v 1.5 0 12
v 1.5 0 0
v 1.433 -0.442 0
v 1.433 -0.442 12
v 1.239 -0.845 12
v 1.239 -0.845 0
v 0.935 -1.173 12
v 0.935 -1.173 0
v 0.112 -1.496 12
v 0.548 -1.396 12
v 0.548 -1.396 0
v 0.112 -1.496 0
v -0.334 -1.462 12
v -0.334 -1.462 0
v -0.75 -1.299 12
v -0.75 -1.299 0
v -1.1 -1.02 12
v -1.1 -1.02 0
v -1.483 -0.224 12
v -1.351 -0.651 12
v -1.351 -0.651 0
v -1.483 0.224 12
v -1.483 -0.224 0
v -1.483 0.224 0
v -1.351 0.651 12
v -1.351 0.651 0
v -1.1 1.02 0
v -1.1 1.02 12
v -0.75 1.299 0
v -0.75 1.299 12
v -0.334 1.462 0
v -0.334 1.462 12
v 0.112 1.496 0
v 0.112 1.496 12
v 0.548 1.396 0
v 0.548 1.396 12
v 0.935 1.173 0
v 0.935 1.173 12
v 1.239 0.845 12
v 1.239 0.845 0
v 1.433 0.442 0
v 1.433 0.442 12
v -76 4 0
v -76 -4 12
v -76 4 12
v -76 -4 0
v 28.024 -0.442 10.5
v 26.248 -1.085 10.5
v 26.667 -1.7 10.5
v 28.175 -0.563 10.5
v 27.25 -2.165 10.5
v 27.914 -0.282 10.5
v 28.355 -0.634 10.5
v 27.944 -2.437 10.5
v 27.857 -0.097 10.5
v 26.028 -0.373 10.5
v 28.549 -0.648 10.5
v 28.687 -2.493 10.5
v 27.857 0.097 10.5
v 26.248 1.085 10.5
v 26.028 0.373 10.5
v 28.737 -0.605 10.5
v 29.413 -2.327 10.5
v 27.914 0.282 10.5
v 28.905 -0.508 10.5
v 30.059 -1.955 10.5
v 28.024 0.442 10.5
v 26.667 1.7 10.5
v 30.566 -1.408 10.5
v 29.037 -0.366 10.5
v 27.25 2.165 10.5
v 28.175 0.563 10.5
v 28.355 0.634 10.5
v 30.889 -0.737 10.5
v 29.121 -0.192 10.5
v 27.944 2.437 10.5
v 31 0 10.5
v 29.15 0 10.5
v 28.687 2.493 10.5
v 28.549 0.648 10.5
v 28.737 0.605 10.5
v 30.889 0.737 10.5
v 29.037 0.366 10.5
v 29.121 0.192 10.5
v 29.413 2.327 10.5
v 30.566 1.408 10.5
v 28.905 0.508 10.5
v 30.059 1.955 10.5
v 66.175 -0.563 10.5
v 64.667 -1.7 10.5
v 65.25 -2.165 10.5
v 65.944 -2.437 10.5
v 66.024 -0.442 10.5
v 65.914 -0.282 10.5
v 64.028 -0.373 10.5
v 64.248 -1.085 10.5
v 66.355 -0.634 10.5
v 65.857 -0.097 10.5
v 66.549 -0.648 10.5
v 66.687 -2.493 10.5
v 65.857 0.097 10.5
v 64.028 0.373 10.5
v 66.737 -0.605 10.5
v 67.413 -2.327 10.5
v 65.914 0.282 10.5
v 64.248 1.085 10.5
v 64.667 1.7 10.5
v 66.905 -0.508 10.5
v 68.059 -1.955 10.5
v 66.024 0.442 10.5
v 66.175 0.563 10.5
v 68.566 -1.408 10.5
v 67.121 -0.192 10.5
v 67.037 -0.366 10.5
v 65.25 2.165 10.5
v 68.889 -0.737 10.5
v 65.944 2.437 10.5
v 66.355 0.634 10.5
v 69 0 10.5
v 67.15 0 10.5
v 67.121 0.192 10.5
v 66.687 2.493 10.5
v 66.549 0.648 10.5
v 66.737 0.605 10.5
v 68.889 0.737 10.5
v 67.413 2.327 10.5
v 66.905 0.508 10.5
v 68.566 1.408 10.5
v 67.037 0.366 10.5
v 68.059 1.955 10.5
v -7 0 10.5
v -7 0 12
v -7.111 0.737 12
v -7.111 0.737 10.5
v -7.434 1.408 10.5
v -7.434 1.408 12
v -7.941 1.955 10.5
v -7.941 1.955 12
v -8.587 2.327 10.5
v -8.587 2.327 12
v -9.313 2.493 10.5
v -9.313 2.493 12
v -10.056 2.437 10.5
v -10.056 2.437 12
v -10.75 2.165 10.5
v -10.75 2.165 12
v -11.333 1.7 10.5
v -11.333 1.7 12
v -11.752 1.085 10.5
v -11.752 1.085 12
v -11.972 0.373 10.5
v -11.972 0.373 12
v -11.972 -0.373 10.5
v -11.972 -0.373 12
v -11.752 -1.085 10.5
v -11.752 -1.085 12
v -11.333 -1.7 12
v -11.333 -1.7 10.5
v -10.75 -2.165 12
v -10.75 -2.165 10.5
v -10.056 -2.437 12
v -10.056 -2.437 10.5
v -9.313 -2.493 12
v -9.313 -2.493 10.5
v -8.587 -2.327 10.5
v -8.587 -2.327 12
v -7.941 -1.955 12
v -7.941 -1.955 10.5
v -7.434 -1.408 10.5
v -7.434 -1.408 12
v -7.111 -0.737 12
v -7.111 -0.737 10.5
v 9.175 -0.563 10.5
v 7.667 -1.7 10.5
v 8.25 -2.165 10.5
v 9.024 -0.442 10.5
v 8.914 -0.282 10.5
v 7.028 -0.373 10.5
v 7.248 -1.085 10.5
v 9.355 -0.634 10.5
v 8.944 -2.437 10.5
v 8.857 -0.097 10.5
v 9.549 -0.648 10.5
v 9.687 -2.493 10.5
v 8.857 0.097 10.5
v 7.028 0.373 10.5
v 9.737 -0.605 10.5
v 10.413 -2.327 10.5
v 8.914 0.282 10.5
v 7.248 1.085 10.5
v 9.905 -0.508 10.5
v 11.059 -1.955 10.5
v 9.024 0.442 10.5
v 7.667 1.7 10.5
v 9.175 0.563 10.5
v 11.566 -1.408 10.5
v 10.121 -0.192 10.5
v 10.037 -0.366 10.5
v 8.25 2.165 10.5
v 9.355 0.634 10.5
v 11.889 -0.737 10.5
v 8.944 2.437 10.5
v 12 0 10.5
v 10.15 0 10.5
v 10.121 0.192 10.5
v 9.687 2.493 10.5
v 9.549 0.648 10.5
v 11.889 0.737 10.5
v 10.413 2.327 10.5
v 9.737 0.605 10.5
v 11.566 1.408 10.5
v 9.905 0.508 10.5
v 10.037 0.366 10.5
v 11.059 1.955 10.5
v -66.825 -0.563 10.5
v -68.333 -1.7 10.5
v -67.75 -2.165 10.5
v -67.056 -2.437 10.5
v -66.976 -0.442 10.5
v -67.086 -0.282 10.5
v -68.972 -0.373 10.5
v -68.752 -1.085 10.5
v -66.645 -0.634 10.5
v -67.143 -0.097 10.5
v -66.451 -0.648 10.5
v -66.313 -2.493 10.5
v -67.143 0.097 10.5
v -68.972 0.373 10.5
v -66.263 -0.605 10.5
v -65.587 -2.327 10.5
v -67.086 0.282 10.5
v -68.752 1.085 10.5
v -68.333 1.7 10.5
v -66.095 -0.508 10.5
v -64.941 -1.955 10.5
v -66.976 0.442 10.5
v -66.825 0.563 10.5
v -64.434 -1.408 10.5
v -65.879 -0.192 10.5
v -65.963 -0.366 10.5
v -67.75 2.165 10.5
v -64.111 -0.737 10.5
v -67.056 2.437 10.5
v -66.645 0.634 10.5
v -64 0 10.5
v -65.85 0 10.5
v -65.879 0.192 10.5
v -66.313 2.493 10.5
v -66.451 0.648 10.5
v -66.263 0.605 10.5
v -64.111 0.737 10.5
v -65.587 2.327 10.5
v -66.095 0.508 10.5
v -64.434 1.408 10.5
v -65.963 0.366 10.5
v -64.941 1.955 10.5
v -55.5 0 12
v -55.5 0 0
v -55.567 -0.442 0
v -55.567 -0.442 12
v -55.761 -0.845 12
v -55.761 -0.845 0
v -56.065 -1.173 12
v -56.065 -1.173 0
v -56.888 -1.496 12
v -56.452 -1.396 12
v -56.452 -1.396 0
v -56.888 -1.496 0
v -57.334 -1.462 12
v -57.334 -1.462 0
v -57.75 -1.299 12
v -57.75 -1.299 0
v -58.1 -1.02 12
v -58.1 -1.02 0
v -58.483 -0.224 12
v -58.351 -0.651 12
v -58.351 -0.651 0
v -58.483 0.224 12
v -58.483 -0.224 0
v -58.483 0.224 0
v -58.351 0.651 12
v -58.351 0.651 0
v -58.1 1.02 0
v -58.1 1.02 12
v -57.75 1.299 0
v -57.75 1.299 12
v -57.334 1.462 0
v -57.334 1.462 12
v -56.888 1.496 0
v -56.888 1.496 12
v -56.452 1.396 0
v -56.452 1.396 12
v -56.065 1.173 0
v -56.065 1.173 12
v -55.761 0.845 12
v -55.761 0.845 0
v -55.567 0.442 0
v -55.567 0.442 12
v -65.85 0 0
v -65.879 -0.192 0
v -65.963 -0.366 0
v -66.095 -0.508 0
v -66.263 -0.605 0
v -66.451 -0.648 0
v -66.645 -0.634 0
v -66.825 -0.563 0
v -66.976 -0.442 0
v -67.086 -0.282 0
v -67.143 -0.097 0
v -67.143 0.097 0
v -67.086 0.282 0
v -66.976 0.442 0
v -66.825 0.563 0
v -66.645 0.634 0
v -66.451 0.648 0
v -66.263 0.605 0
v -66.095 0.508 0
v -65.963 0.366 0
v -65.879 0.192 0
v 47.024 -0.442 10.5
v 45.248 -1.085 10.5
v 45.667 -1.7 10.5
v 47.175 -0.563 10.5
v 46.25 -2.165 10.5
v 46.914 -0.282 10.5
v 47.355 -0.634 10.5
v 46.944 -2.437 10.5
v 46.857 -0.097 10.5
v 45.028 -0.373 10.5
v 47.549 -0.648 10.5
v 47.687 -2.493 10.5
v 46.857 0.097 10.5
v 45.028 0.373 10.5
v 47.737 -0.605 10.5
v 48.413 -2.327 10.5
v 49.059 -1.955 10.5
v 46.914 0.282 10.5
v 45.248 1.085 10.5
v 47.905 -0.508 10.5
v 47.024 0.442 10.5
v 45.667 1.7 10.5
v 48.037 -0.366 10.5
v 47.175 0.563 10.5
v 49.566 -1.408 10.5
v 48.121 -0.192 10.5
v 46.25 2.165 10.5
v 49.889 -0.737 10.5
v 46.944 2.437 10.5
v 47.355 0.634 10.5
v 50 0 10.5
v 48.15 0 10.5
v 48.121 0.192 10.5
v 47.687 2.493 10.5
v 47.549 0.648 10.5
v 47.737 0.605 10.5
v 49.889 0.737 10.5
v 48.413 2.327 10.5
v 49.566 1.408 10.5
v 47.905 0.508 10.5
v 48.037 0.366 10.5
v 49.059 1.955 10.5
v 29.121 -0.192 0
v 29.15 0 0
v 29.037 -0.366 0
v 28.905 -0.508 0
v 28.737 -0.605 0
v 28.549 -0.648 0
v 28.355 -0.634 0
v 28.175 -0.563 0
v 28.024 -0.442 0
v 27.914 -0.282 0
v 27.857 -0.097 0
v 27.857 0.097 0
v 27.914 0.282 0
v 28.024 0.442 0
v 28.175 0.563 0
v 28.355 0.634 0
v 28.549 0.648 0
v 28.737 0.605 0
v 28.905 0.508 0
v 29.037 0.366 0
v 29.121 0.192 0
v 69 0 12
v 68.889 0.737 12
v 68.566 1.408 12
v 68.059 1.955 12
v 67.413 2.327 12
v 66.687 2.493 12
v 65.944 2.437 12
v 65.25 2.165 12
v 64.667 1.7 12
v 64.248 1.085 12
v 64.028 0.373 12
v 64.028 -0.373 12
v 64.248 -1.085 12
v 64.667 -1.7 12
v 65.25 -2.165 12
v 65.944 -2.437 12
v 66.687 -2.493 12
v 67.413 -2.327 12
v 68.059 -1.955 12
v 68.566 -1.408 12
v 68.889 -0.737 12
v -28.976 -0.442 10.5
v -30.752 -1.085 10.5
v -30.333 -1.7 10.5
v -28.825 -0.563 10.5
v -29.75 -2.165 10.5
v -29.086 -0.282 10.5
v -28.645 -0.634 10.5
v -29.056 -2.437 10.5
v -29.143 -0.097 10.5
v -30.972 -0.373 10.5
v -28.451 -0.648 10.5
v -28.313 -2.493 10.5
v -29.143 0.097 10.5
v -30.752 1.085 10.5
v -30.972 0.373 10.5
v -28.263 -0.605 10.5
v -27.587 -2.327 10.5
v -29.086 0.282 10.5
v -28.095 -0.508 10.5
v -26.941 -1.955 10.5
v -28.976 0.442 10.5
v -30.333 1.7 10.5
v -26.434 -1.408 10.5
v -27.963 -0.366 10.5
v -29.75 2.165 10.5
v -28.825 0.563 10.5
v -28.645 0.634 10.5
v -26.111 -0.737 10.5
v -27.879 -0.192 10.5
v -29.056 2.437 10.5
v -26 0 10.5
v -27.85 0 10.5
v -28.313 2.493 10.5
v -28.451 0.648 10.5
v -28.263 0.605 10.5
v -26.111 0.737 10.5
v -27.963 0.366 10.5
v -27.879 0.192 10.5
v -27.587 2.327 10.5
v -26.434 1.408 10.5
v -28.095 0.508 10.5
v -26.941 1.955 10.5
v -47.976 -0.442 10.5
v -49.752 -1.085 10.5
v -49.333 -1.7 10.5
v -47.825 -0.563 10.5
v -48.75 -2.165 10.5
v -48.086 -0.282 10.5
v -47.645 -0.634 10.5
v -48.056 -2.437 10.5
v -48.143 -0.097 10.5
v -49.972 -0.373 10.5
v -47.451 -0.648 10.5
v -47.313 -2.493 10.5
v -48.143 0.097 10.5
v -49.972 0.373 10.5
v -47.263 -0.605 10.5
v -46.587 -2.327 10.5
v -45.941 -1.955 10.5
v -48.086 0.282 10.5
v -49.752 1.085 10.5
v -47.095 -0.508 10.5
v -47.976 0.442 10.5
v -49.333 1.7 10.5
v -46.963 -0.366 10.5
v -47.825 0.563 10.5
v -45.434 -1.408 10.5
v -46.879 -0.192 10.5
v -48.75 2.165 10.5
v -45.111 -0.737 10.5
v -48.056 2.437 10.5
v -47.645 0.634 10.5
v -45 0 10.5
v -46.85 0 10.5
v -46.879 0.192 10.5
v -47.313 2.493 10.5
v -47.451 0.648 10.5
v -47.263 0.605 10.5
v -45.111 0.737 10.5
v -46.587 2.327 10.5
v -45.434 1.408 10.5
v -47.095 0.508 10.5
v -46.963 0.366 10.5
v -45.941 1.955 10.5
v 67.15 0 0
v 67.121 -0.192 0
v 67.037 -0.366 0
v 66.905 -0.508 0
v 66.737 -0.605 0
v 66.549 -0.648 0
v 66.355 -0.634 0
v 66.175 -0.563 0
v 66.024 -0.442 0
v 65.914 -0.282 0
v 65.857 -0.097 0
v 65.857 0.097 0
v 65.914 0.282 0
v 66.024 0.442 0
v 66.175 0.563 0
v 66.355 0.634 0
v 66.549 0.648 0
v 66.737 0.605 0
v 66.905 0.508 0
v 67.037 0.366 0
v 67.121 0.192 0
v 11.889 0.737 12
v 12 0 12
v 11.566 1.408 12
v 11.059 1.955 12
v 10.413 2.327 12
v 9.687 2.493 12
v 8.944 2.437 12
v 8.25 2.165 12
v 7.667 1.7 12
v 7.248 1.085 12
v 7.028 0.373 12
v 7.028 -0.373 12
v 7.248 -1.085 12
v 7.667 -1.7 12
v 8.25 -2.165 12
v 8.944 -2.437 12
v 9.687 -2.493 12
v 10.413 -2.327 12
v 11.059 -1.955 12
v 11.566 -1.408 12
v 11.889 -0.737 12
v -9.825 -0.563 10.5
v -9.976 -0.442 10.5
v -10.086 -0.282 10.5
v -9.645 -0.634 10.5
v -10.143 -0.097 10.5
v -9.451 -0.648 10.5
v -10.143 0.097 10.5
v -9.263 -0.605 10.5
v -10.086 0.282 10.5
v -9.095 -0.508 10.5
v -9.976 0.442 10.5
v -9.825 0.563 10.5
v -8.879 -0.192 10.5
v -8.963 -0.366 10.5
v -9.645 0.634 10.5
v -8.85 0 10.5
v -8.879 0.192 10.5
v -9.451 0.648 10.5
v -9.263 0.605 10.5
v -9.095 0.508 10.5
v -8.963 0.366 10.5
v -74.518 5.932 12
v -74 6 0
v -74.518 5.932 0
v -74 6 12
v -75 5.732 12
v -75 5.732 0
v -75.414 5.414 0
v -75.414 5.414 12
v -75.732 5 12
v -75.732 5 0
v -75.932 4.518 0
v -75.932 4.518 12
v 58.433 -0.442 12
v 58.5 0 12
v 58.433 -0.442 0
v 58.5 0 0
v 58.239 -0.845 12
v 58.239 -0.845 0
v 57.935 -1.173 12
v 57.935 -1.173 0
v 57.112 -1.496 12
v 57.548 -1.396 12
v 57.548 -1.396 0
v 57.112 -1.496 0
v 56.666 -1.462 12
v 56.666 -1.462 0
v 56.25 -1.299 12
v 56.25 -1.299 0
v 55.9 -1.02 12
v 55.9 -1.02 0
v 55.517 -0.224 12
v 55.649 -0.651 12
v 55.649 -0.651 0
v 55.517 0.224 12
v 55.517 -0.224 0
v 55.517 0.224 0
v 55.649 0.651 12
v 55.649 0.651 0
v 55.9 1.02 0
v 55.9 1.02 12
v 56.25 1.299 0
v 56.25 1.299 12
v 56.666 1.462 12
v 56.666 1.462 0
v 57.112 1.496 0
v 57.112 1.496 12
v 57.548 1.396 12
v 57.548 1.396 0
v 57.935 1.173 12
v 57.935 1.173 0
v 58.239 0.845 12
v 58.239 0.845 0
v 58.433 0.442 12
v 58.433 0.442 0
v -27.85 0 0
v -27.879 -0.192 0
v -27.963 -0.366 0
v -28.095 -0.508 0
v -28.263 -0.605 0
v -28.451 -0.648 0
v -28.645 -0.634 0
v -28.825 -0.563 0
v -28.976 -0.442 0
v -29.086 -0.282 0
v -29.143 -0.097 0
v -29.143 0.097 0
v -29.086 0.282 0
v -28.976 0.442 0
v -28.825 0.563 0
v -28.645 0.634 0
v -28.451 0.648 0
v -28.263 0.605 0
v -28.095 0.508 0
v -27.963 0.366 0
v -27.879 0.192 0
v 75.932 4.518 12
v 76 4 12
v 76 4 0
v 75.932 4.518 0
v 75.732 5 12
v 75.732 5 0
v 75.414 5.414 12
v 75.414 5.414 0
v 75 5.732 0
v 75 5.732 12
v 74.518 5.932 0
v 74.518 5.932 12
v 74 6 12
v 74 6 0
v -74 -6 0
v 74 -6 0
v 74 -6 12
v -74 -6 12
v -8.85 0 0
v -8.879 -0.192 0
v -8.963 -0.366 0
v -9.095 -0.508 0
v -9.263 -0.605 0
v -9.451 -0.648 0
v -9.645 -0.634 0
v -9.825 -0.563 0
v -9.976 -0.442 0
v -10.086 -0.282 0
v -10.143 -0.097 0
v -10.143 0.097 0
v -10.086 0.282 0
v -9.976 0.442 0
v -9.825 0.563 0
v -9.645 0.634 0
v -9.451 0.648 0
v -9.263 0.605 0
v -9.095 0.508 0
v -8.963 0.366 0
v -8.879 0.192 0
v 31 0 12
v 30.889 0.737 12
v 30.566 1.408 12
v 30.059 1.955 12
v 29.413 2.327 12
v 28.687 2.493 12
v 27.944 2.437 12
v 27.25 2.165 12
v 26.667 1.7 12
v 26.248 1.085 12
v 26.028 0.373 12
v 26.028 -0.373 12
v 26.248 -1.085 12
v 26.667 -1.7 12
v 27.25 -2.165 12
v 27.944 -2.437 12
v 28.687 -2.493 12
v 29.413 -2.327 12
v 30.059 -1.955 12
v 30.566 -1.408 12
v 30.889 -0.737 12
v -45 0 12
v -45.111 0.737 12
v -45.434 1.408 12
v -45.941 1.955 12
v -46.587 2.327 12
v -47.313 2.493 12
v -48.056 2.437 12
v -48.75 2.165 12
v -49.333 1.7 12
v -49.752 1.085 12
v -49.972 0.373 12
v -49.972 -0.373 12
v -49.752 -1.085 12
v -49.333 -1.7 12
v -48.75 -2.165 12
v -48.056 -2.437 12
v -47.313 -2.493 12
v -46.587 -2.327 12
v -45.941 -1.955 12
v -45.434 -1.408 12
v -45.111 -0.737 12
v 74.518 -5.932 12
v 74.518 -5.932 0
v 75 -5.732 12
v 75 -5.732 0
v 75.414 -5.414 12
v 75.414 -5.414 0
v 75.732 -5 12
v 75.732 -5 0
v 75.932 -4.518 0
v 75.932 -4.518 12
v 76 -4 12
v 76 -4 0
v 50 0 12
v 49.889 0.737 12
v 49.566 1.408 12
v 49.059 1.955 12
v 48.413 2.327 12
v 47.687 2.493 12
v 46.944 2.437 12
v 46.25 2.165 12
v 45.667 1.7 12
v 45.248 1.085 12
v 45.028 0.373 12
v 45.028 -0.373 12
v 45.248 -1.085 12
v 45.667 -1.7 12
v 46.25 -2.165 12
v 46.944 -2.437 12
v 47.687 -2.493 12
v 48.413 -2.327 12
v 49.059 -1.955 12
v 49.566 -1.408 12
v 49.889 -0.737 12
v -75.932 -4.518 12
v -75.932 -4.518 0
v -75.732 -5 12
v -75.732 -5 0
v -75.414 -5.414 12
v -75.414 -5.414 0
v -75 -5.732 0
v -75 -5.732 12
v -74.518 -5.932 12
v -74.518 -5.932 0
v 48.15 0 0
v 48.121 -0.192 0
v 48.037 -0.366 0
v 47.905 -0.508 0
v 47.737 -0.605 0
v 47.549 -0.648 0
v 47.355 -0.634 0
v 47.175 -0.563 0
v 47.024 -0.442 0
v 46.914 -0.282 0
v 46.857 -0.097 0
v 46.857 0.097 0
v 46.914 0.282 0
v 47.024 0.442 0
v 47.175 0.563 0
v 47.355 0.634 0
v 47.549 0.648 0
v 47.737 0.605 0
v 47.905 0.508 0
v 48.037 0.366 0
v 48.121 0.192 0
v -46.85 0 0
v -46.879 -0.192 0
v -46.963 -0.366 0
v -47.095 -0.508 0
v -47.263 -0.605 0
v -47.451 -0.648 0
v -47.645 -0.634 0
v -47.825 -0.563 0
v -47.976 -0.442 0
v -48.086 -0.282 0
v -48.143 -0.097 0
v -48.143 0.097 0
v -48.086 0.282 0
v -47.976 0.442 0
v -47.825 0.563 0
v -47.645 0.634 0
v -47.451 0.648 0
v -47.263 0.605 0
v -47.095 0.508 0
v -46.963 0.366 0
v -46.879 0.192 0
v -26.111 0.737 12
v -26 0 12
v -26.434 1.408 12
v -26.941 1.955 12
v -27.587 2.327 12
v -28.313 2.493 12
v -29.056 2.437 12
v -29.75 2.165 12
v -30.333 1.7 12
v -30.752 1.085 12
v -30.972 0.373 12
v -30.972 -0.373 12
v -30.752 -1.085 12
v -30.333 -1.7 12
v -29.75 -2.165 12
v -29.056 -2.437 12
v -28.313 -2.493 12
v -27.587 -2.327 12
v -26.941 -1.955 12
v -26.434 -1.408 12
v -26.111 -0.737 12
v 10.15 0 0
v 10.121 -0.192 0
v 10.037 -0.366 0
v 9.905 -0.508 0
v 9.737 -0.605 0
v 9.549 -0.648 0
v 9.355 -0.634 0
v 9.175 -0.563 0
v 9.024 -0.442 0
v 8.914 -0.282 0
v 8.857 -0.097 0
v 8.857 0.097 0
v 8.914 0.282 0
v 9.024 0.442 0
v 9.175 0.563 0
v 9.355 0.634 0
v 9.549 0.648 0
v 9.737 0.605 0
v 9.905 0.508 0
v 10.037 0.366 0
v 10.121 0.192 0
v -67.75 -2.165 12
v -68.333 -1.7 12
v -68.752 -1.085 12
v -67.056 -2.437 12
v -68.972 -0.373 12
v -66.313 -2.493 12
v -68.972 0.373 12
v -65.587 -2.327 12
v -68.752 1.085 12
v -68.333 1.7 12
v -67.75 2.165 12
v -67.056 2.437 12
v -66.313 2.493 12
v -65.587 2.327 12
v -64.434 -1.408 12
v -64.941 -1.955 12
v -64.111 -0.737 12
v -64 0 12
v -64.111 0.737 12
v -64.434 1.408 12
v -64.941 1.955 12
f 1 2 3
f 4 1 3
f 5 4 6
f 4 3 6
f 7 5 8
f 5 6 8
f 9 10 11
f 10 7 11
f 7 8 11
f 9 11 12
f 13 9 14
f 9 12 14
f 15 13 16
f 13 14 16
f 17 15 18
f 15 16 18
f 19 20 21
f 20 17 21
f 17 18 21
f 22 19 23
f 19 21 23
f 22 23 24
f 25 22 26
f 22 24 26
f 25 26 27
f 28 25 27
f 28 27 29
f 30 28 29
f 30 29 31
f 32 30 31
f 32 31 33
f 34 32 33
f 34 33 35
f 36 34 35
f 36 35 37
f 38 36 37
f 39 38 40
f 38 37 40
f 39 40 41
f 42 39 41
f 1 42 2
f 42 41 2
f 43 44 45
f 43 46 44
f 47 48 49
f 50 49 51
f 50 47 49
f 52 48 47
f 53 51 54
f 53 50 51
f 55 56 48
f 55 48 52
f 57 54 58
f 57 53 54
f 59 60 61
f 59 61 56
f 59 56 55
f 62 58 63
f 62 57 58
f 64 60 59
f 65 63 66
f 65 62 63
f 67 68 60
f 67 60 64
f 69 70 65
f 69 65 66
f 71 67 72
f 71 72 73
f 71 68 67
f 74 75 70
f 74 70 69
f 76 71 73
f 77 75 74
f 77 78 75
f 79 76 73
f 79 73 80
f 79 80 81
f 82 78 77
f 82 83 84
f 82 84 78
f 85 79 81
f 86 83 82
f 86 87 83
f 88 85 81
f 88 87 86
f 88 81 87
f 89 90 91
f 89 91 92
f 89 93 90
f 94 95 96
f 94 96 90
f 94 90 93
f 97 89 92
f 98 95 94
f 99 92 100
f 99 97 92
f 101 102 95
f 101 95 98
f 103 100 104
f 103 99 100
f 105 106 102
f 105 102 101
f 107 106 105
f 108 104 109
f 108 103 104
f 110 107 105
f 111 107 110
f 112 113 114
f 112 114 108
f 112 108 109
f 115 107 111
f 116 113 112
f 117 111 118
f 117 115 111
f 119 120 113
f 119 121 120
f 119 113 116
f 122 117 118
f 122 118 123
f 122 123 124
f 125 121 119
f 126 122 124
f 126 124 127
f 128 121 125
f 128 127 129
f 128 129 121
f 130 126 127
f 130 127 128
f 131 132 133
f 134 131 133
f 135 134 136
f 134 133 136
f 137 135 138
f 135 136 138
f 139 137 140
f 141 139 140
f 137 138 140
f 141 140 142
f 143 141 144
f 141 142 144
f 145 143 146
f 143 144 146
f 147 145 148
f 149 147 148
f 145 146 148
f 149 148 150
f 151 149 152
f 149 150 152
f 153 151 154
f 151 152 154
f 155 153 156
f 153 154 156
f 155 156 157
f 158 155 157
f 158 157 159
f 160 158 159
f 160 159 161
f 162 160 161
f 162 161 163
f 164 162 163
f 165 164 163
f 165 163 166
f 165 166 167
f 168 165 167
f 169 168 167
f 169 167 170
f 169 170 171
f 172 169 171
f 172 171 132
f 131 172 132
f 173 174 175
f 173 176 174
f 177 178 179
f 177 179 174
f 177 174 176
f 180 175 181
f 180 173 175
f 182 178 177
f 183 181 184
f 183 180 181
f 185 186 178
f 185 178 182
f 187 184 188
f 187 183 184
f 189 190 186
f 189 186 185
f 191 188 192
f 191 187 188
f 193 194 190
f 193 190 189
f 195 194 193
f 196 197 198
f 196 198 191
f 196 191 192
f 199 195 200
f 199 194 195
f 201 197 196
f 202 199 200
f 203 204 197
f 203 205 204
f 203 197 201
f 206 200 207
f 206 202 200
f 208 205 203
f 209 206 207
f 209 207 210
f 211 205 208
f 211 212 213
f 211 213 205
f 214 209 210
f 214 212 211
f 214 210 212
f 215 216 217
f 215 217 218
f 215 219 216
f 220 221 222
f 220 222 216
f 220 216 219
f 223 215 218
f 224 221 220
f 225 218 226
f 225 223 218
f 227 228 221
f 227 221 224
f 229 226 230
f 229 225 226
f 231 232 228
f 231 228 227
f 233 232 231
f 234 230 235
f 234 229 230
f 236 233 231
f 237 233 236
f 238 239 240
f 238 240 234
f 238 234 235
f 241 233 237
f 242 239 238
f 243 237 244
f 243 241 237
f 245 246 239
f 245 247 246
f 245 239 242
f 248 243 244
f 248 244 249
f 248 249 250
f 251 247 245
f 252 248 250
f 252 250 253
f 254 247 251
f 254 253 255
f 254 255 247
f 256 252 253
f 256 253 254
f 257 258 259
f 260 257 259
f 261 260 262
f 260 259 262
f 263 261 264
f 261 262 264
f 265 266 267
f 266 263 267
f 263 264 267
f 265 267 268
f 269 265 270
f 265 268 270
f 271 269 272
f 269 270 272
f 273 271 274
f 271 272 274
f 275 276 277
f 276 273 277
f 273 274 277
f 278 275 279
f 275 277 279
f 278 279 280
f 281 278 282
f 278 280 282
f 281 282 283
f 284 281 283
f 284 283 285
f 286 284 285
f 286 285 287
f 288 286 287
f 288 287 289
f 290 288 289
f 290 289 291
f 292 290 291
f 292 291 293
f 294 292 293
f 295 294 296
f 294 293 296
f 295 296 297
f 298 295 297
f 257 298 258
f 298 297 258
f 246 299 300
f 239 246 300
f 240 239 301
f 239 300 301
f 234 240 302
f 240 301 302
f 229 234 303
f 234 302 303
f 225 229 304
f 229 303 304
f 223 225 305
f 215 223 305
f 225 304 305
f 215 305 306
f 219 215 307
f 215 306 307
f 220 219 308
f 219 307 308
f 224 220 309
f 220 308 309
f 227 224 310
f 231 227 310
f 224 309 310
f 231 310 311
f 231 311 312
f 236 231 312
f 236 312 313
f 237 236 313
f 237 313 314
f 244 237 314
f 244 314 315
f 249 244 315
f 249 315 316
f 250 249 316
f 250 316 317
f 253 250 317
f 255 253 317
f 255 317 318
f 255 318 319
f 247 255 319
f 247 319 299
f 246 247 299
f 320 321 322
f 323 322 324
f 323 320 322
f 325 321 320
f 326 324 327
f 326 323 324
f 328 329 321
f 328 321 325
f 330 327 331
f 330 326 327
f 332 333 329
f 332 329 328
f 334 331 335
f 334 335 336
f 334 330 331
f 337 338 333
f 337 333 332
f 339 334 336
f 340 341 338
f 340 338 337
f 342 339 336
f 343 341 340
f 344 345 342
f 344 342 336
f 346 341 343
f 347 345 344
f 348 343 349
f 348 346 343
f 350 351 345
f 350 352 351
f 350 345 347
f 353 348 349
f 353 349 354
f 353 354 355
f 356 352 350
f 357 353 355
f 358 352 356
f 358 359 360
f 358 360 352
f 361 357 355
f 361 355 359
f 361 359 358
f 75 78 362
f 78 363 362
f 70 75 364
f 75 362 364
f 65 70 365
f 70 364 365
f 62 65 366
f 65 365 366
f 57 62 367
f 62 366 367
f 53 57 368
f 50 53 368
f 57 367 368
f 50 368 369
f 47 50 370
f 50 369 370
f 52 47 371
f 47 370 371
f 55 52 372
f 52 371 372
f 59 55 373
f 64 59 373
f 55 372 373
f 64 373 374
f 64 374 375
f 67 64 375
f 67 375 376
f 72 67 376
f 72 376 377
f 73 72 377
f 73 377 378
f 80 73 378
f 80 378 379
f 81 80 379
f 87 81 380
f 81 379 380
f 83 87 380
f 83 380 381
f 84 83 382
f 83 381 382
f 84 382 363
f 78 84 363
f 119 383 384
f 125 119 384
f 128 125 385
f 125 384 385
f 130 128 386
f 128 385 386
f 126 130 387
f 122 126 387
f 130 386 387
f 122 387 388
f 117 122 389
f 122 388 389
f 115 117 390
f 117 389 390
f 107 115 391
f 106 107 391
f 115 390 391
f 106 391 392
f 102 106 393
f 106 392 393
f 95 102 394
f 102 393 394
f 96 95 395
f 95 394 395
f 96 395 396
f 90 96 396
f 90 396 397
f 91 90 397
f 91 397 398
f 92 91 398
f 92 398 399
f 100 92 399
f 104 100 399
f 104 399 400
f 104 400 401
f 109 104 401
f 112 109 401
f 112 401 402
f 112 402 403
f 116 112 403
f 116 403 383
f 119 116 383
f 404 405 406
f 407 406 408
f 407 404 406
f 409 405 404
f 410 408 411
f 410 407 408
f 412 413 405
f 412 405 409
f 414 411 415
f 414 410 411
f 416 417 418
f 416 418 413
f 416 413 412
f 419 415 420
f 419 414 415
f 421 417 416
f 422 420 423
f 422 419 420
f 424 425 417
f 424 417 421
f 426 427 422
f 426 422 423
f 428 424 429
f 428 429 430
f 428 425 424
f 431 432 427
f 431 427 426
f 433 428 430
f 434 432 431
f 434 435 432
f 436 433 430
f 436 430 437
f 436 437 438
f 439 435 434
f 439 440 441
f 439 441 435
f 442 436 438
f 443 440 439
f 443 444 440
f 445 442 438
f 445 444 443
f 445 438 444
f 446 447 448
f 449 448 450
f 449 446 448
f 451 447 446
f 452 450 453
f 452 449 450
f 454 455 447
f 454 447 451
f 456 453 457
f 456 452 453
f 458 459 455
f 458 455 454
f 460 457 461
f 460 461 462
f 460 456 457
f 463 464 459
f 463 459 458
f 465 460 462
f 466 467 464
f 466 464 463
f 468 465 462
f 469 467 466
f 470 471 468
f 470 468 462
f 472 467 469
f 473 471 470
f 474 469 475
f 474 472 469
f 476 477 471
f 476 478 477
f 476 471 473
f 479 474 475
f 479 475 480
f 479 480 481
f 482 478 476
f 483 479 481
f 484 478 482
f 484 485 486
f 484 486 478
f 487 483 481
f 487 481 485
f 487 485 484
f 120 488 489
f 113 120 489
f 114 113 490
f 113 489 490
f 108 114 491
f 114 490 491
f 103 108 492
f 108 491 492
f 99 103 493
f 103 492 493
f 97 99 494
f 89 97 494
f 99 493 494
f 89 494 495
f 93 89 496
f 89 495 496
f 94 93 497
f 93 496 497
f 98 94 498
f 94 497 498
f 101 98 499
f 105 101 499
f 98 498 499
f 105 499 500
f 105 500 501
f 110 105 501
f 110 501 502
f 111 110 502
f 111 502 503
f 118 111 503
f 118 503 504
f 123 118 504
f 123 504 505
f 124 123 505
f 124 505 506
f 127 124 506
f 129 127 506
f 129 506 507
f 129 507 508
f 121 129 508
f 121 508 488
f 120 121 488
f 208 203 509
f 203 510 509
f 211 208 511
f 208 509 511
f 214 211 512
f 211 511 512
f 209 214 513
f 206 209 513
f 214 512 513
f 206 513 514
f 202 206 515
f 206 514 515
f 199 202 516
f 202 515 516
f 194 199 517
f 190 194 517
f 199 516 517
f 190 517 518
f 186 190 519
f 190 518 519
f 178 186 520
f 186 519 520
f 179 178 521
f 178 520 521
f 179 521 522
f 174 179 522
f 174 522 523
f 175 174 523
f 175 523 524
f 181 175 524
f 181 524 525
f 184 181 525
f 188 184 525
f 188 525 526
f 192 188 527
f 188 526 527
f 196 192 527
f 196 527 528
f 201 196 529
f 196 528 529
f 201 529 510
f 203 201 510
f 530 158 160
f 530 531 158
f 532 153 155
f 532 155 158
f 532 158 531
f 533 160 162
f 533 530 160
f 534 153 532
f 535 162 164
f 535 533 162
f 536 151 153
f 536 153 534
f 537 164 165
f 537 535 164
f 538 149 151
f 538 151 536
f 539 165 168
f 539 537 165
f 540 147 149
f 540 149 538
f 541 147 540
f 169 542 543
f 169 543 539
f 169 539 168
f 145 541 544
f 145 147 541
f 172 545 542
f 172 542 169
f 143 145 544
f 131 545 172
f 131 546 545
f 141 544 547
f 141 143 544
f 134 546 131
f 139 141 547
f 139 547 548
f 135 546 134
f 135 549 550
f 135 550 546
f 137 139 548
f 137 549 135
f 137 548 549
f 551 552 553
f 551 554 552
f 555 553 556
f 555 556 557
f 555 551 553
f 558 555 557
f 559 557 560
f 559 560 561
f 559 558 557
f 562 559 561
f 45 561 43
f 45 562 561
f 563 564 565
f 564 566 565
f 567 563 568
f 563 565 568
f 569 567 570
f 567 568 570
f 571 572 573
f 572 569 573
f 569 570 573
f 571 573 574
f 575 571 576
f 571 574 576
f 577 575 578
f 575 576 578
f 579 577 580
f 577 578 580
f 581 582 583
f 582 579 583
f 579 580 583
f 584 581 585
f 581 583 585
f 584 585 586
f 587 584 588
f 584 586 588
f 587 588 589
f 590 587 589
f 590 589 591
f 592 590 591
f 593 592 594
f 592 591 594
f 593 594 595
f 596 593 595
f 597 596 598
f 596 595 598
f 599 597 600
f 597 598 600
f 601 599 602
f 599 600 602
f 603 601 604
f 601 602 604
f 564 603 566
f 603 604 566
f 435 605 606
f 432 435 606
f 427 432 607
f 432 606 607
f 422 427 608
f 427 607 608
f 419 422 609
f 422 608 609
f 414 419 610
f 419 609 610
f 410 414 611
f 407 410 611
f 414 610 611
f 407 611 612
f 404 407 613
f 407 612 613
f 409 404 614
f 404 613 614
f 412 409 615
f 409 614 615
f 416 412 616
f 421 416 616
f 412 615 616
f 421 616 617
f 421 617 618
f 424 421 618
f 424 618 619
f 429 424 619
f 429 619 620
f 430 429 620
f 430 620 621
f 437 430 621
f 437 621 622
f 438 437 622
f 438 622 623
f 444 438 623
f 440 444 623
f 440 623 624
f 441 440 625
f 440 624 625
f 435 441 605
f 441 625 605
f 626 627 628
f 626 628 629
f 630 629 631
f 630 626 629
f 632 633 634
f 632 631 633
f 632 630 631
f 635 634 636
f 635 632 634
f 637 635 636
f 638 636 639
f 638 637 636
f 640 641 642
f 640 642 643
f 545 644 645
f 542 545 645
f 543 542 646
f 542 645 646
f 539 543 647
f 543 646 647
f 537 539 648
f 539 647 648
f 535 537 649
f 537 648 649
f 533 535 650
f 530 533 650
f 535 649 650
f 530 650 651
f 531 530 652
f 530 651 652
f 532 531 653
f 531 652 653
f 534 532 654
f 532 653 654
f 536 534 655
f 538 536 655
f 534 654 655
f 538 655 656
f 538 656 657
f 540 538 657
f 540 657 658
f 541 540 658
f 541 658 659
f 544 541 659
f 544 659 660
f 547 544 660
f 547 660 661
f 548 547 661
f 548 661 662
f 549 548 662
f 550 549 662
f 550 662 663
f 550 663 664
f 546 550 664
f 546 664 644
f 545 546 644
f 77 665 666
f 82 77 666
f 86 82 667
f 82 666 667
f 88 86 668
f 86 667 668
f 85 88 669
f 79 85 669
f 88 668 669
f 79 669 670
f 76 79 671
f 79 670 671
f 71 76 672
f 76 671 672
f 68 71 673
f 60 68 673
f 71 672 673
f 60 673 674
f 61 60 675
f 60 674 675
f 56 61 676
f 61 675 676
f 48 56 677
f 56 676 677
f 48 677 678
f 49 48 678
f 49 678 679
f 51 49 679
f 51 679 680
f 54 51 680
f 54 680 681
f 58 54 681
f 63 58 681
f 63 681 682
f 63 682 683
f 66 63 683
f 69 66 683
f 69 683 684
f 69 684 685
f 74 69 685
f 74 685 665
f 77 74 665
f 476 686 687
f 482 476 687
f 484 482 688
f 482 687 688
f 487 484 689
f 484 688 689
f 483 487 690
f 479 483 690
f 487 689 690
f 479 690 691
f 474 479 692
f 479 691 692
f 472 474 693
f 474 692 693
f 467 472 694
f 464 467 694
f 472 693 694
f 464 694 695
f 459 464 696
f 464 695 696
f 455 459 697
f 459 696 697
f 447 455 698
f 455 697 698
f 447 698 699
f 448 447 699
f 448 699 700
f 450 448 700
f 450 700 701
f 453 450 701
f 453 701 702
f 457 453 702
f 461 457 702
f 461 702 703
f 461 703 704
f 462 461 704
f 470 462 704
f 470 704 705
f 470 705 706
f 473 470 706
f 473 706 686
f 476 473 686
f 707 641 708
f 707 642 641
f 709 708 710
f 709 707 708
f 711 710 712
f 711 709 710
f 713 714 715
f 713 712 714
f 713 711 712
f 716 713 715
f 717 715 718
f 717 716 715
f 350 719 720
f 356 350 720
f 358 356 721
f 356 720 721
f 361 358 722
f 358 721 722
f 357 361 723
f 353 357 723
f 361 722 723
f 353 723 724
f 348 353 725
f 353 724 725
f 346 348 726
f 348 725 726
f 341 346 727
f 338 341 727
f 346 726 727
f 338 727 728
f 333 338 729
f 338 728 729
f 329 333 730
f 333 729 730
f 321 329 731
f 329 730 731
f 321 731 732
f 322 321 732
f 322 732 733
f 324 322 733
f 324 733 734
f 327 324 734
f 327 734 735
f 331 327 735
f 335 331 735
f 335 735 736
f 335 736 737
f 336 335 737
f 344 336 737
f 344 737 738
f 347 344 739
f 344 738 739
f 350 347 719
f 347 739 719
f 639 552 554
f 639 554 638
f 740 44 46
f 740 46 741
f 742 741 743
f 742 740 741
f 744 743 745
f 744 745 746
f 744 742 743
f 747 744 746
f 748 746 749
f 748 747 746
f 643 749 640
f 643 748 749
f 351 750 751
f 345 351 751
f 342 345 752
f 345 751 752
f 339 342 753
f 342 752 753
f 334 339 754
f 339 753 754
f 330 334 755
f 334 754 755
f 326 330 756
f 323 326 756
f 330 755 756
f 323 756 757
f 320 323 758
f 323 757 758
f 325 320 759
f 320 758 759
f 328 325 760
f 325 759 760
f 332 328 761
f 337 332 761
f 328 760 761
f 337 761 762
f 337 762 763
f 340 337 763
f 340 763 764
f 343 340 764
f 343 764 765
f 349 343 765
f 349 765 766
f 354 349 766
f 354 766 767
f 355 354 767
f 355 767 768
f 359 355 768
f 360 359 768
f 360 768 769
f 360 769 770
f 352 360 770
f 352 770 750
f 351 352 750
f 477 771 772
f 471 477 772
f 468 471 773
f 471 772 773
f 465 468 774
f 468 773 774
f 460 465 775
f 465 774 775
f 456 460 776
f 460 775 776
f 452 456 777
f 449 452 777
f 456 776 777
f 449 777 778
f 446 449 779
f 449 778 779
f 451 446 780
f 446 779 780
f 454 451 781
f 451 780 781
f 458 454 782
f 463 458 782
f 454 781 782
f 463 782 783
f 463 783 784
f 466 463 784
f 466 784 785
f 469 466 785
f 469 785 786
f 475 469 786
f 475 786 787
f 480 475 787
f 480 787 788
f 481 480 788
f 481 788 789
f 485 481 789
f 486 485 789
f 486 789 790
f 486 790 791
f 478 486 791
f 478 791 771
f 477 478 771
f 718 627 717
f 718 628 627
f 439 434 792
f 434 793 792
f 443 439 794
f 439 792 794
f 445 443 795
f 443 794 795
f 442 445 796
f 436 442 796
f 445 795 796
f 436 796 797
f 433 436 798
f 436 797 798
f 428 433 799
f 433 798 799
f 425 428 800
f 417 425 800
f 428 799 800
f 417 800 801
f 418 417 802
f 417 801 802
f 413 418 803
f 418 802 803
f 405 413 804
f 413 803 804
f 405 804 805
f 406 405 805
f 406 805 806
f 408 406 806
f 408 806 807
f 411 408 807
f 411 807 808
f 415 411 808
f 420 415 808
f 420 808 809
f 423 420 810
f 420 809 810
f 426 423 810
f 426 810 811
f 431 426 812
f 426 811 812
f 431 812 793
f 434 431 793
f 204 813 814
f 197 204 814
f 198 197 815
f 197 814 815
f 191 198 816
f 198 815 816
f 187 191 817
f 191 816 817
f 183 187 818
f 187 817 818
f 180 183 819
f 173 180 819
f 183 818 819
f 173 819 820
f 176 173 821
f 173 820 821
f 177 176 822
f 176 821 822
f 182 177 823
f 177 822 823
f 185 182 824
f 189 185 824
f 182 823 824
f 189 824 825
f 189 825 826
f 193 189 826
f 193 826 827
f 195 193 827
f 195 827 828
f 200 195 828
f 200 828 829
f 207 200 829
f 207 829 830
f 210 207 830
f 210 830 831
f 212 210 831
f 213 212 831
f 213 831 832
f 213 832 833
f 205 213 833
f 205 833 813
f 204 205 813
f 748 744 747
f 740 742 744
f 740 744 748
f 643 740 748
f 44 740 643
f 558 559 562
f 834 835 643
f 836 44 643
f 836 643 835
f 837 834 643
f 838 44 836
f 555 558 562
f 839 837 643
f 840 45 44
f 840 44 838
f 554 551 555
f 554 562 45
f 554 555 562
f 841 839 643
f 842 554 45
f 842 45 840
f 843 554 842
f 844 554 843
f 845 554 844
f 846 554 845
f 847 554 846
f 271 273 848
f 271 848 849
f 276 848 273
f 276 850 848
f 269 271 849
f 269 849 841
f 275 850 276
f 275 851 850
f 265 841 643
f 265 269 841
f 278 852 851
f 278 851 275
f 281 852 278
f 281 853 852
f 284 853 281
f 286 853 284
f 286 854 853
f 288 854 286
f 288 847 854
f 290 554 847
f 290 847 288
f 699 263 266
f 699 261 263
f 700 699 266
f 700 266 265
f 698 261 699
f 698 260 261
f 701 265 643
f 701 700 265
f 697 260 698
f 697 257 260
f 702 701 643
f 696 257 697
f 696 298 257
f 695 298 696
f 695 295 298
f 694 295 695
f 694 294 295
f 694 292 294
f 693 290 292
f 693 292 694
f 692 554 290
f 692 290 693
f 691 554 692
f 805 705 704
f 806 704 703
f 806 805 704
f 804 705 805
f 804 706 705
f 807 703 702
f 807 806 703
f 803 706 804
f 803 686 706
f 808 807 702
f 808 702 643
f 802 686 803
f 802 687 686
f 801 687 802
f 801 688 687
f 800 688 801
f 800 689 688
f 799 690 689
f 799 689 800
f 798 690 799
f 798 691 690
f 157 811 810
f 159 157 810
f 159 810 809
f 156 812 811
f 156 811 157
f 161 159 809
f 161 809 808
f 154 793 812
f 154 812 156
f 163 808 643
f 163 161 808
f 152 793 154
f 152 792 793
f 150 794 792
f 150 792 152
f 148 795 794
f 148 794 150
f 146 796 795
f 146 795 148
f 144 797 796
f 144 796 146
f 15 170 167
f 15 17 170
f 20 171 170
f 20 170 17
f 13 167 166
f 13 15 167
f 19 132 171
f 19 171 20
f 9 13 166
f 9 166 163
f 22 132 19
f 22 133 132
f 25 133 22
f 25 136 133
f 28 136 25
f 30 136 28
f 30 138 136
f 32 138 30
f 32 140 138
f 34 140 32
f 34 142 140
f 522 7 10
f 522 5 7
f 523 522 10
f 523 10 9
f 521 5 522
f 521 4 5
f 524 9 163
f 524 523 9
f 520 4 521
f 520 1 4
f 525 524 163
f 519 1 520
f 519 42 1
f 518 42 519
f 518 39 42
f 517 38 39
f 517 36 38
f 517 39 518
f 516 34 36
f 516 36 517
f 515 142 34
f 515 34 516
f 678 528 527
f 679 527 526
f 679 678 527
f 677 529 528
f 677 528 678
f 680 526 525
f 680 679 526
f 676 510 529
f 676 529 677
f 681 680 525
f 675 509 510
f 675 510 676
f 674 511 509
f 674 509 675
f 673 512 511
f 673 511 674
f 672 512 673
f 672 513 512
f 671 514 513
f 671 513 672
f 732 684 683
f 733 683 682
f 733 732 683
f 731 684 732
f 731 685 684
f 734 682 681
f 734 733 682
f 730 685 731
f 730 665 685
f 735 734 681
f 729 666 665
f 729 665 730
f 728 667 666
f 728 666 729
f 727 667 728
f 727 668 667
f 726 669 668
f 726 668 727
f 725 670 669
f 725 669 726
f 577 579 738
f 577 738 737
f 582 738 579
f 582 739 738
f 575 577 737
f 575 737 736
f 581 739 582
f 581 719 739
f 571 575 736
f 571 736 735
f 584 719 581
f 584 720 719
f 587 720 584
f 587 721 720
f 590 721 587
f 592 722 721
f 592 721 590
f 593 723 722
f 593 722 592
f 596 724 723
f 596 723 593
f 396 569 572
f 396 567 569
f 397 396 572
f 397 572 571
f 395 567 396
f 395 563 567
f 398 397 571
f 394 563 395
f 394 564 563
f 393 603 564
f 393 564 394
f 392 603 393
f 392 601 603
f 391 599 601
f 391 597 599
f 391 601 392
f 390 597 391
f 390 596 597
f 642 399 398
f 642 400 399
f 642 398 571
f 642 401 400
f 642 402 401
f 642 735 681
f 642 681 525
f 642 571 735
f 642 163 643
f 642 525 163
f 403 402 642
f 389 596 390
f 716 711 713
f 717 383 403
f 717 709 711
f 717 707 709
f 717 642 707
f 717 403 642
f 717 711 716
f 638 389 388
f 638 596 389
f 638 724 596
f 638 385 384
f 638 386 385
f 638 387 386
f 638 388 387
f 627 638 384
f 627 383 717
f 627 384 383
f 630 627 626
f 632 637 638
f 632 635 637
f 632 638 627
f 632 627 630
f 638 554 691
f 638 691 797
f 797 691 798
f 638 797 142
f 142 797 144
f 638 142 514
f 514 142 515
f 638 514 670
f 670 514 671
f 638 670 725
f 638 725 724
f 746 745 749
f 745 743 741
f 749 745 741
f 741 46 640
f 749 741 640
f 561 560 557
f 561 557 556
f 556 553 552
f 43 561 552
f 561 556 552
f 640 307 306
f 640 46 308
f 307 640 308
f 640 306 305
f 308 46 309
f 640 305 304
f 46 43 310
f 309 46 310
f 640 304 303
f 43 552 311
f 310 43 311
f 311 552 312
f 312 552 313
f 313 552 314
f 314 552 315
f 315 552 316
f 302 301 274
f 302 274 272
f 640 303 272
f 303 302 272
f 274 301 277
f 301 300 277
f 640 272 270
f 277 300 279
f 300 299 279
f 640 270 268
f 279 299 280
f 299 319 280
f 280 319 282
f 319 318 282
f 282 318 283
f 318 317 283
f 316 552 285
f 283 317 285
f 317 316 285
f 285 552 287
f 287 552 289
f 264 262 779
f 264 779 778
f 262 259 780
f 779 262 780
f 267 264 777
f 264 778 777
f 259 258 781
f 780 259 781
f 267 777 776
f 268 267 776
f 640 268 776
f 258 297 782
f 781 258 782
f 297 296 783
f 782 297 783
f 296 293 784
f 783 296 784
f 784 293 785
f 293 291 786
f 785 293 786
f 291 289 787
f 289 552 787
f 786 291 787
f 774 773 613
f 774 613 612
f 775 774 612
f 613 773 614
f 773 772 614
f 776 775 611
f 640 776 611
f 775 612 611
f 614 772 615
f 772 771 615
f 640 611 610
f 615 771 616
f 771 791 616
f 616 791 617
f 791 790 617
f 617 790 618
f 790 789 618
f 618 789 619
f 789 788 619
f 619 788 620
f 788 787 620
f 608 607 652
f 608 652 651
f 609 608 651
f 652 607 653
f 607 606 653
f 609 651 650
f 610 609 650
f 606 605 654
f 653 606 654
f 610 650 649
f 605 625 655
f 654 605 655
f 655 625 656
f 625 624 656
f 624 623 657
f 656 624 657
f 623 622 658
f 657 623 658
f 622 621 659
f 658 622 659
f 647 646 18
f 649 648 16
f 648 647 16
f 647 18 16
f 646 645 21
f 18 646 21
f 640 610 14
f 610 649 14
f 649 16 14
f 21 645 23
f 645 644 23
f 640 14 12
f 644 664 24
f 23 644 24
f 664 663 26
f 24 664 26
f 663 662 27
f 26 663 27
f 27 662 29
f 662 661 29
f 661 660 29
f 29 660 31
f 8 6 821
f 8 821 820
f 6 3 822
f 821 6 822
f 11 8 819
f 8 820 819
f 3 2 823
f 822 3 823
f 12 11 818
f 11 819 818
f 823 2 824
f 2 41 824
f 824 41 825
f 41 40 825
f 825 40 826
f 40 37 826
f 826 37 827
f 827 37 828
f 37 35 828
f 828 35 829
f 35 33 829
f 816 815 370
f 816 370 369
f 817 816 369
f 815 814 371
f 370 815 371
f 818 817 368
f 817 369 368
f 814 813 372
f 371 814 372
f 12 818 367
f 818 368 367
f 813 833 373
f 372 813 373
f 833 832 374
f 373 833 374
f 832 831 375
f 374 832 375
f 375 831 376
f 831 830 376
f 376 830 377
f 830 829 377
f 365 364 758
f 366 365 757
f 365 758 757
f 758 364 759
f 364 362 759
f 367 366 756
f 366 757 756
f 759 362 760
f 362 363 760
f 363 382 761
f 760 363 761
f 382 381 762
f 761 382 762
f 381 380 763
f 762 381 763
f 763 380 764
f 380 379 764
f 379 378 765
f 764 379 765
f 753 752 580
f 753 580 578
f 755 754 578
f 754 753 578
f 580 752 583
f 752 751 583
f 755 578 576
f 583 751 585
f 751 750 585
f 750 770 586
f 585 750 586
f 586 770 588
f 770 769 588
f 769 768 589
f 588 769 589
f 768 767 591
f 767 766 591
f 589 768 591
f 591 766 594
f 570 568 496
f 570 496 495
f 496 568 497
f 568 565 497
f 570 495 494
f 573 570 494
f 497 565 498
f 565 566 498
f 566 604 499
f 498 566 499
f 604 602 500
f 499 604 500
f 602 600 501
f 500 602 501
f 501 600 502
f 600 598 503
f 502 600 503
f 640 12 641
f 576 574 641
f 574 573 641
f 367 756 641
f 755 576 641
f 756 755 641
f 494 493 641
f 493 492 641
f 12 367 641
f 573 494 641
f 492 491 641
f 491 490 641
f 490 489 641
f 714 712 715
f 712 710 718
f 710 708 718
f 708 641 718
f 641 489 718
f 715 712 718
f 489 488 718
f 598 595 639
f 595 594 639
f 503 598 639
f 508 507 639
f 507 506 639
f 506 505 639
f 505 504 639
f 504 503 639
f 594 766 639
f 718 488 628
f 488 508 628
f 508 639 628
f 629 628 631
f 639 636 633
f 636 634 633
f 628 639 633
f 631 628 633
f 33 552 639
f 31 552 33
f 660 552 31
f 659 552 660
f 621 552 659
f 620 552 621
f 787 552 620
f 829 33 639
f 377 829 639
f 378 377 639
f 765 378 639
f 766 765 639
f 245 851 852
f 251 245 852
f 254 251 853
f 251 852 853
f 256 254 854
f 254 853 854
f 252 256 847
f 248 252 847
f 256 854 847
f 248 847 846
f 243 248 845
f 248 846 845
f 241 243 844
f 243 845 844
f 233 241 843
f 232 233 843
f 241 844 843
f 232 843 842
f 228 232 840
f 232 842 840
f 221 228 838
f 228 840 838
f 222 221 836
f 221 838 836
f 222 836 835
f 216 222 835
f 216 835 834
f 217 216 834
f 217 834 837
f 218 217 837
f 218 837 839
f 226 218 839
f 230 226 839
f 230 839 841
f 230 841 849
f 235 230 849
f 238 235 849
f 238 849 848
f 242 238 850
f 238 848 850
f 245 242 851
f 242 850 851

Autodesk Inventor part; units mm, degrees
ref_plane "YZ Plane" through (0, 0, 0) normal (1, 0, 0) x (0, 1, 0)
ref_plane "XZ Plane" through (0, 0, 0) normal (0, 1, 0) x (-1, 0, 0)
ref_plane "XY Plane" through (0, 0, 0) normal (0, 0, 1) x (1, 0, 0)
sketch "Boceto1" plane through (0, 0, 0) normal (0, 0, 1) x (1, 0, 0)
  line L0 (-76, 6) -> (76, 6)
  line L1 (76, 6) -> (76, -6)
  line L2 (76, -6) -> (-76, -6)
  line L3 (-76, -6) -> (-76, 6)
  circle A0 centre (0, 0) radius 1.5
  circle A1 centre (57, 0) radius 1.5
  circle A2 centre (-57, 0) radius 1.5
  circle A3 centre (-9.5, 0) radius 0.65
  circle A4 centre (9.5, 0) radius 0.65
  circle A5 centre (28.5, 0) radius 0.65
  circle A6 centre (47.5, 0) radius 0.65
  circle A7 centre (66.5, 0) radius 0.65
  circle A8 centre (-28.5, 0) radius 0.65
  circle A9 centre (-47.5, 0) radius 0.65
  circle A10 centre (-66.5, 0) radius 0.65
  point P0 (-76, 0)
  point P1 (0, 6)
  dimension "d0" = 152
  dimension "d1" = 12
  dimension "d2" = 3
  dimension "d3" = 3
  dimension "d4" = 3
  dimension "d5" = 57
  dimension "d6" = 57
  dimension "d7" = 1.3
  dimension "d8" = 1.3
  dimension "d9" = 19
  dimension "d10" = 9.5
  dimension "d13" = 19
  dimension "d20" = 19
extrude "Extrusión1" add sketch "Boceto1" along normal blind 12
sketch "Boceto2" plane through (0, 0, 12) normal (0, 0, 1) x (1, 0, 0)
  circle A0 centre (-66.5, 0) radius 0.65 projected
  circle A1 centre (-66.5, 0) radius 2.5
  line L0 (-76, 0) -> (76, 0) construction
  line L1 (76, -6) -> (76, 6) construction
  circle A2 centre (-47.5, 0) radius 2.5
  circle A3 centre (-28.5, 0) radius 2.5
  circle A4 centre (-9.5, 0) radius 2.5
  circle A5 centre (9.5, 0) radius 2.5
  circle A6 centre (28.5, 0) radius 2.5
  circle A7 centre (47.5, 0) radius 2.5
  circle A8 centre (66.5, 0) radius 2.5
  point P0 (0, 0)
  dimension "d27" = 5
  dimension "d30" = 19
  dimension "d35" = 152
extrude "Extrusión2" cut sketch "Boceto2" against normal blind 1.5 contours A0 | A1 | A2 | A3 | A4 | A5 | A6 | A7 | A8
fillet "Empalme1" radius 2 4 edges at (-76, -6, 6) (76, -6, 6) (76, 6, 6) (-76, 6, 6)
equation "\"d6\" = d5"
equation "\"d8\" = d7"
equation "\"d10\" = 0.5 * d9"
properties part number "Guia fibra 8Ch V2_2"
